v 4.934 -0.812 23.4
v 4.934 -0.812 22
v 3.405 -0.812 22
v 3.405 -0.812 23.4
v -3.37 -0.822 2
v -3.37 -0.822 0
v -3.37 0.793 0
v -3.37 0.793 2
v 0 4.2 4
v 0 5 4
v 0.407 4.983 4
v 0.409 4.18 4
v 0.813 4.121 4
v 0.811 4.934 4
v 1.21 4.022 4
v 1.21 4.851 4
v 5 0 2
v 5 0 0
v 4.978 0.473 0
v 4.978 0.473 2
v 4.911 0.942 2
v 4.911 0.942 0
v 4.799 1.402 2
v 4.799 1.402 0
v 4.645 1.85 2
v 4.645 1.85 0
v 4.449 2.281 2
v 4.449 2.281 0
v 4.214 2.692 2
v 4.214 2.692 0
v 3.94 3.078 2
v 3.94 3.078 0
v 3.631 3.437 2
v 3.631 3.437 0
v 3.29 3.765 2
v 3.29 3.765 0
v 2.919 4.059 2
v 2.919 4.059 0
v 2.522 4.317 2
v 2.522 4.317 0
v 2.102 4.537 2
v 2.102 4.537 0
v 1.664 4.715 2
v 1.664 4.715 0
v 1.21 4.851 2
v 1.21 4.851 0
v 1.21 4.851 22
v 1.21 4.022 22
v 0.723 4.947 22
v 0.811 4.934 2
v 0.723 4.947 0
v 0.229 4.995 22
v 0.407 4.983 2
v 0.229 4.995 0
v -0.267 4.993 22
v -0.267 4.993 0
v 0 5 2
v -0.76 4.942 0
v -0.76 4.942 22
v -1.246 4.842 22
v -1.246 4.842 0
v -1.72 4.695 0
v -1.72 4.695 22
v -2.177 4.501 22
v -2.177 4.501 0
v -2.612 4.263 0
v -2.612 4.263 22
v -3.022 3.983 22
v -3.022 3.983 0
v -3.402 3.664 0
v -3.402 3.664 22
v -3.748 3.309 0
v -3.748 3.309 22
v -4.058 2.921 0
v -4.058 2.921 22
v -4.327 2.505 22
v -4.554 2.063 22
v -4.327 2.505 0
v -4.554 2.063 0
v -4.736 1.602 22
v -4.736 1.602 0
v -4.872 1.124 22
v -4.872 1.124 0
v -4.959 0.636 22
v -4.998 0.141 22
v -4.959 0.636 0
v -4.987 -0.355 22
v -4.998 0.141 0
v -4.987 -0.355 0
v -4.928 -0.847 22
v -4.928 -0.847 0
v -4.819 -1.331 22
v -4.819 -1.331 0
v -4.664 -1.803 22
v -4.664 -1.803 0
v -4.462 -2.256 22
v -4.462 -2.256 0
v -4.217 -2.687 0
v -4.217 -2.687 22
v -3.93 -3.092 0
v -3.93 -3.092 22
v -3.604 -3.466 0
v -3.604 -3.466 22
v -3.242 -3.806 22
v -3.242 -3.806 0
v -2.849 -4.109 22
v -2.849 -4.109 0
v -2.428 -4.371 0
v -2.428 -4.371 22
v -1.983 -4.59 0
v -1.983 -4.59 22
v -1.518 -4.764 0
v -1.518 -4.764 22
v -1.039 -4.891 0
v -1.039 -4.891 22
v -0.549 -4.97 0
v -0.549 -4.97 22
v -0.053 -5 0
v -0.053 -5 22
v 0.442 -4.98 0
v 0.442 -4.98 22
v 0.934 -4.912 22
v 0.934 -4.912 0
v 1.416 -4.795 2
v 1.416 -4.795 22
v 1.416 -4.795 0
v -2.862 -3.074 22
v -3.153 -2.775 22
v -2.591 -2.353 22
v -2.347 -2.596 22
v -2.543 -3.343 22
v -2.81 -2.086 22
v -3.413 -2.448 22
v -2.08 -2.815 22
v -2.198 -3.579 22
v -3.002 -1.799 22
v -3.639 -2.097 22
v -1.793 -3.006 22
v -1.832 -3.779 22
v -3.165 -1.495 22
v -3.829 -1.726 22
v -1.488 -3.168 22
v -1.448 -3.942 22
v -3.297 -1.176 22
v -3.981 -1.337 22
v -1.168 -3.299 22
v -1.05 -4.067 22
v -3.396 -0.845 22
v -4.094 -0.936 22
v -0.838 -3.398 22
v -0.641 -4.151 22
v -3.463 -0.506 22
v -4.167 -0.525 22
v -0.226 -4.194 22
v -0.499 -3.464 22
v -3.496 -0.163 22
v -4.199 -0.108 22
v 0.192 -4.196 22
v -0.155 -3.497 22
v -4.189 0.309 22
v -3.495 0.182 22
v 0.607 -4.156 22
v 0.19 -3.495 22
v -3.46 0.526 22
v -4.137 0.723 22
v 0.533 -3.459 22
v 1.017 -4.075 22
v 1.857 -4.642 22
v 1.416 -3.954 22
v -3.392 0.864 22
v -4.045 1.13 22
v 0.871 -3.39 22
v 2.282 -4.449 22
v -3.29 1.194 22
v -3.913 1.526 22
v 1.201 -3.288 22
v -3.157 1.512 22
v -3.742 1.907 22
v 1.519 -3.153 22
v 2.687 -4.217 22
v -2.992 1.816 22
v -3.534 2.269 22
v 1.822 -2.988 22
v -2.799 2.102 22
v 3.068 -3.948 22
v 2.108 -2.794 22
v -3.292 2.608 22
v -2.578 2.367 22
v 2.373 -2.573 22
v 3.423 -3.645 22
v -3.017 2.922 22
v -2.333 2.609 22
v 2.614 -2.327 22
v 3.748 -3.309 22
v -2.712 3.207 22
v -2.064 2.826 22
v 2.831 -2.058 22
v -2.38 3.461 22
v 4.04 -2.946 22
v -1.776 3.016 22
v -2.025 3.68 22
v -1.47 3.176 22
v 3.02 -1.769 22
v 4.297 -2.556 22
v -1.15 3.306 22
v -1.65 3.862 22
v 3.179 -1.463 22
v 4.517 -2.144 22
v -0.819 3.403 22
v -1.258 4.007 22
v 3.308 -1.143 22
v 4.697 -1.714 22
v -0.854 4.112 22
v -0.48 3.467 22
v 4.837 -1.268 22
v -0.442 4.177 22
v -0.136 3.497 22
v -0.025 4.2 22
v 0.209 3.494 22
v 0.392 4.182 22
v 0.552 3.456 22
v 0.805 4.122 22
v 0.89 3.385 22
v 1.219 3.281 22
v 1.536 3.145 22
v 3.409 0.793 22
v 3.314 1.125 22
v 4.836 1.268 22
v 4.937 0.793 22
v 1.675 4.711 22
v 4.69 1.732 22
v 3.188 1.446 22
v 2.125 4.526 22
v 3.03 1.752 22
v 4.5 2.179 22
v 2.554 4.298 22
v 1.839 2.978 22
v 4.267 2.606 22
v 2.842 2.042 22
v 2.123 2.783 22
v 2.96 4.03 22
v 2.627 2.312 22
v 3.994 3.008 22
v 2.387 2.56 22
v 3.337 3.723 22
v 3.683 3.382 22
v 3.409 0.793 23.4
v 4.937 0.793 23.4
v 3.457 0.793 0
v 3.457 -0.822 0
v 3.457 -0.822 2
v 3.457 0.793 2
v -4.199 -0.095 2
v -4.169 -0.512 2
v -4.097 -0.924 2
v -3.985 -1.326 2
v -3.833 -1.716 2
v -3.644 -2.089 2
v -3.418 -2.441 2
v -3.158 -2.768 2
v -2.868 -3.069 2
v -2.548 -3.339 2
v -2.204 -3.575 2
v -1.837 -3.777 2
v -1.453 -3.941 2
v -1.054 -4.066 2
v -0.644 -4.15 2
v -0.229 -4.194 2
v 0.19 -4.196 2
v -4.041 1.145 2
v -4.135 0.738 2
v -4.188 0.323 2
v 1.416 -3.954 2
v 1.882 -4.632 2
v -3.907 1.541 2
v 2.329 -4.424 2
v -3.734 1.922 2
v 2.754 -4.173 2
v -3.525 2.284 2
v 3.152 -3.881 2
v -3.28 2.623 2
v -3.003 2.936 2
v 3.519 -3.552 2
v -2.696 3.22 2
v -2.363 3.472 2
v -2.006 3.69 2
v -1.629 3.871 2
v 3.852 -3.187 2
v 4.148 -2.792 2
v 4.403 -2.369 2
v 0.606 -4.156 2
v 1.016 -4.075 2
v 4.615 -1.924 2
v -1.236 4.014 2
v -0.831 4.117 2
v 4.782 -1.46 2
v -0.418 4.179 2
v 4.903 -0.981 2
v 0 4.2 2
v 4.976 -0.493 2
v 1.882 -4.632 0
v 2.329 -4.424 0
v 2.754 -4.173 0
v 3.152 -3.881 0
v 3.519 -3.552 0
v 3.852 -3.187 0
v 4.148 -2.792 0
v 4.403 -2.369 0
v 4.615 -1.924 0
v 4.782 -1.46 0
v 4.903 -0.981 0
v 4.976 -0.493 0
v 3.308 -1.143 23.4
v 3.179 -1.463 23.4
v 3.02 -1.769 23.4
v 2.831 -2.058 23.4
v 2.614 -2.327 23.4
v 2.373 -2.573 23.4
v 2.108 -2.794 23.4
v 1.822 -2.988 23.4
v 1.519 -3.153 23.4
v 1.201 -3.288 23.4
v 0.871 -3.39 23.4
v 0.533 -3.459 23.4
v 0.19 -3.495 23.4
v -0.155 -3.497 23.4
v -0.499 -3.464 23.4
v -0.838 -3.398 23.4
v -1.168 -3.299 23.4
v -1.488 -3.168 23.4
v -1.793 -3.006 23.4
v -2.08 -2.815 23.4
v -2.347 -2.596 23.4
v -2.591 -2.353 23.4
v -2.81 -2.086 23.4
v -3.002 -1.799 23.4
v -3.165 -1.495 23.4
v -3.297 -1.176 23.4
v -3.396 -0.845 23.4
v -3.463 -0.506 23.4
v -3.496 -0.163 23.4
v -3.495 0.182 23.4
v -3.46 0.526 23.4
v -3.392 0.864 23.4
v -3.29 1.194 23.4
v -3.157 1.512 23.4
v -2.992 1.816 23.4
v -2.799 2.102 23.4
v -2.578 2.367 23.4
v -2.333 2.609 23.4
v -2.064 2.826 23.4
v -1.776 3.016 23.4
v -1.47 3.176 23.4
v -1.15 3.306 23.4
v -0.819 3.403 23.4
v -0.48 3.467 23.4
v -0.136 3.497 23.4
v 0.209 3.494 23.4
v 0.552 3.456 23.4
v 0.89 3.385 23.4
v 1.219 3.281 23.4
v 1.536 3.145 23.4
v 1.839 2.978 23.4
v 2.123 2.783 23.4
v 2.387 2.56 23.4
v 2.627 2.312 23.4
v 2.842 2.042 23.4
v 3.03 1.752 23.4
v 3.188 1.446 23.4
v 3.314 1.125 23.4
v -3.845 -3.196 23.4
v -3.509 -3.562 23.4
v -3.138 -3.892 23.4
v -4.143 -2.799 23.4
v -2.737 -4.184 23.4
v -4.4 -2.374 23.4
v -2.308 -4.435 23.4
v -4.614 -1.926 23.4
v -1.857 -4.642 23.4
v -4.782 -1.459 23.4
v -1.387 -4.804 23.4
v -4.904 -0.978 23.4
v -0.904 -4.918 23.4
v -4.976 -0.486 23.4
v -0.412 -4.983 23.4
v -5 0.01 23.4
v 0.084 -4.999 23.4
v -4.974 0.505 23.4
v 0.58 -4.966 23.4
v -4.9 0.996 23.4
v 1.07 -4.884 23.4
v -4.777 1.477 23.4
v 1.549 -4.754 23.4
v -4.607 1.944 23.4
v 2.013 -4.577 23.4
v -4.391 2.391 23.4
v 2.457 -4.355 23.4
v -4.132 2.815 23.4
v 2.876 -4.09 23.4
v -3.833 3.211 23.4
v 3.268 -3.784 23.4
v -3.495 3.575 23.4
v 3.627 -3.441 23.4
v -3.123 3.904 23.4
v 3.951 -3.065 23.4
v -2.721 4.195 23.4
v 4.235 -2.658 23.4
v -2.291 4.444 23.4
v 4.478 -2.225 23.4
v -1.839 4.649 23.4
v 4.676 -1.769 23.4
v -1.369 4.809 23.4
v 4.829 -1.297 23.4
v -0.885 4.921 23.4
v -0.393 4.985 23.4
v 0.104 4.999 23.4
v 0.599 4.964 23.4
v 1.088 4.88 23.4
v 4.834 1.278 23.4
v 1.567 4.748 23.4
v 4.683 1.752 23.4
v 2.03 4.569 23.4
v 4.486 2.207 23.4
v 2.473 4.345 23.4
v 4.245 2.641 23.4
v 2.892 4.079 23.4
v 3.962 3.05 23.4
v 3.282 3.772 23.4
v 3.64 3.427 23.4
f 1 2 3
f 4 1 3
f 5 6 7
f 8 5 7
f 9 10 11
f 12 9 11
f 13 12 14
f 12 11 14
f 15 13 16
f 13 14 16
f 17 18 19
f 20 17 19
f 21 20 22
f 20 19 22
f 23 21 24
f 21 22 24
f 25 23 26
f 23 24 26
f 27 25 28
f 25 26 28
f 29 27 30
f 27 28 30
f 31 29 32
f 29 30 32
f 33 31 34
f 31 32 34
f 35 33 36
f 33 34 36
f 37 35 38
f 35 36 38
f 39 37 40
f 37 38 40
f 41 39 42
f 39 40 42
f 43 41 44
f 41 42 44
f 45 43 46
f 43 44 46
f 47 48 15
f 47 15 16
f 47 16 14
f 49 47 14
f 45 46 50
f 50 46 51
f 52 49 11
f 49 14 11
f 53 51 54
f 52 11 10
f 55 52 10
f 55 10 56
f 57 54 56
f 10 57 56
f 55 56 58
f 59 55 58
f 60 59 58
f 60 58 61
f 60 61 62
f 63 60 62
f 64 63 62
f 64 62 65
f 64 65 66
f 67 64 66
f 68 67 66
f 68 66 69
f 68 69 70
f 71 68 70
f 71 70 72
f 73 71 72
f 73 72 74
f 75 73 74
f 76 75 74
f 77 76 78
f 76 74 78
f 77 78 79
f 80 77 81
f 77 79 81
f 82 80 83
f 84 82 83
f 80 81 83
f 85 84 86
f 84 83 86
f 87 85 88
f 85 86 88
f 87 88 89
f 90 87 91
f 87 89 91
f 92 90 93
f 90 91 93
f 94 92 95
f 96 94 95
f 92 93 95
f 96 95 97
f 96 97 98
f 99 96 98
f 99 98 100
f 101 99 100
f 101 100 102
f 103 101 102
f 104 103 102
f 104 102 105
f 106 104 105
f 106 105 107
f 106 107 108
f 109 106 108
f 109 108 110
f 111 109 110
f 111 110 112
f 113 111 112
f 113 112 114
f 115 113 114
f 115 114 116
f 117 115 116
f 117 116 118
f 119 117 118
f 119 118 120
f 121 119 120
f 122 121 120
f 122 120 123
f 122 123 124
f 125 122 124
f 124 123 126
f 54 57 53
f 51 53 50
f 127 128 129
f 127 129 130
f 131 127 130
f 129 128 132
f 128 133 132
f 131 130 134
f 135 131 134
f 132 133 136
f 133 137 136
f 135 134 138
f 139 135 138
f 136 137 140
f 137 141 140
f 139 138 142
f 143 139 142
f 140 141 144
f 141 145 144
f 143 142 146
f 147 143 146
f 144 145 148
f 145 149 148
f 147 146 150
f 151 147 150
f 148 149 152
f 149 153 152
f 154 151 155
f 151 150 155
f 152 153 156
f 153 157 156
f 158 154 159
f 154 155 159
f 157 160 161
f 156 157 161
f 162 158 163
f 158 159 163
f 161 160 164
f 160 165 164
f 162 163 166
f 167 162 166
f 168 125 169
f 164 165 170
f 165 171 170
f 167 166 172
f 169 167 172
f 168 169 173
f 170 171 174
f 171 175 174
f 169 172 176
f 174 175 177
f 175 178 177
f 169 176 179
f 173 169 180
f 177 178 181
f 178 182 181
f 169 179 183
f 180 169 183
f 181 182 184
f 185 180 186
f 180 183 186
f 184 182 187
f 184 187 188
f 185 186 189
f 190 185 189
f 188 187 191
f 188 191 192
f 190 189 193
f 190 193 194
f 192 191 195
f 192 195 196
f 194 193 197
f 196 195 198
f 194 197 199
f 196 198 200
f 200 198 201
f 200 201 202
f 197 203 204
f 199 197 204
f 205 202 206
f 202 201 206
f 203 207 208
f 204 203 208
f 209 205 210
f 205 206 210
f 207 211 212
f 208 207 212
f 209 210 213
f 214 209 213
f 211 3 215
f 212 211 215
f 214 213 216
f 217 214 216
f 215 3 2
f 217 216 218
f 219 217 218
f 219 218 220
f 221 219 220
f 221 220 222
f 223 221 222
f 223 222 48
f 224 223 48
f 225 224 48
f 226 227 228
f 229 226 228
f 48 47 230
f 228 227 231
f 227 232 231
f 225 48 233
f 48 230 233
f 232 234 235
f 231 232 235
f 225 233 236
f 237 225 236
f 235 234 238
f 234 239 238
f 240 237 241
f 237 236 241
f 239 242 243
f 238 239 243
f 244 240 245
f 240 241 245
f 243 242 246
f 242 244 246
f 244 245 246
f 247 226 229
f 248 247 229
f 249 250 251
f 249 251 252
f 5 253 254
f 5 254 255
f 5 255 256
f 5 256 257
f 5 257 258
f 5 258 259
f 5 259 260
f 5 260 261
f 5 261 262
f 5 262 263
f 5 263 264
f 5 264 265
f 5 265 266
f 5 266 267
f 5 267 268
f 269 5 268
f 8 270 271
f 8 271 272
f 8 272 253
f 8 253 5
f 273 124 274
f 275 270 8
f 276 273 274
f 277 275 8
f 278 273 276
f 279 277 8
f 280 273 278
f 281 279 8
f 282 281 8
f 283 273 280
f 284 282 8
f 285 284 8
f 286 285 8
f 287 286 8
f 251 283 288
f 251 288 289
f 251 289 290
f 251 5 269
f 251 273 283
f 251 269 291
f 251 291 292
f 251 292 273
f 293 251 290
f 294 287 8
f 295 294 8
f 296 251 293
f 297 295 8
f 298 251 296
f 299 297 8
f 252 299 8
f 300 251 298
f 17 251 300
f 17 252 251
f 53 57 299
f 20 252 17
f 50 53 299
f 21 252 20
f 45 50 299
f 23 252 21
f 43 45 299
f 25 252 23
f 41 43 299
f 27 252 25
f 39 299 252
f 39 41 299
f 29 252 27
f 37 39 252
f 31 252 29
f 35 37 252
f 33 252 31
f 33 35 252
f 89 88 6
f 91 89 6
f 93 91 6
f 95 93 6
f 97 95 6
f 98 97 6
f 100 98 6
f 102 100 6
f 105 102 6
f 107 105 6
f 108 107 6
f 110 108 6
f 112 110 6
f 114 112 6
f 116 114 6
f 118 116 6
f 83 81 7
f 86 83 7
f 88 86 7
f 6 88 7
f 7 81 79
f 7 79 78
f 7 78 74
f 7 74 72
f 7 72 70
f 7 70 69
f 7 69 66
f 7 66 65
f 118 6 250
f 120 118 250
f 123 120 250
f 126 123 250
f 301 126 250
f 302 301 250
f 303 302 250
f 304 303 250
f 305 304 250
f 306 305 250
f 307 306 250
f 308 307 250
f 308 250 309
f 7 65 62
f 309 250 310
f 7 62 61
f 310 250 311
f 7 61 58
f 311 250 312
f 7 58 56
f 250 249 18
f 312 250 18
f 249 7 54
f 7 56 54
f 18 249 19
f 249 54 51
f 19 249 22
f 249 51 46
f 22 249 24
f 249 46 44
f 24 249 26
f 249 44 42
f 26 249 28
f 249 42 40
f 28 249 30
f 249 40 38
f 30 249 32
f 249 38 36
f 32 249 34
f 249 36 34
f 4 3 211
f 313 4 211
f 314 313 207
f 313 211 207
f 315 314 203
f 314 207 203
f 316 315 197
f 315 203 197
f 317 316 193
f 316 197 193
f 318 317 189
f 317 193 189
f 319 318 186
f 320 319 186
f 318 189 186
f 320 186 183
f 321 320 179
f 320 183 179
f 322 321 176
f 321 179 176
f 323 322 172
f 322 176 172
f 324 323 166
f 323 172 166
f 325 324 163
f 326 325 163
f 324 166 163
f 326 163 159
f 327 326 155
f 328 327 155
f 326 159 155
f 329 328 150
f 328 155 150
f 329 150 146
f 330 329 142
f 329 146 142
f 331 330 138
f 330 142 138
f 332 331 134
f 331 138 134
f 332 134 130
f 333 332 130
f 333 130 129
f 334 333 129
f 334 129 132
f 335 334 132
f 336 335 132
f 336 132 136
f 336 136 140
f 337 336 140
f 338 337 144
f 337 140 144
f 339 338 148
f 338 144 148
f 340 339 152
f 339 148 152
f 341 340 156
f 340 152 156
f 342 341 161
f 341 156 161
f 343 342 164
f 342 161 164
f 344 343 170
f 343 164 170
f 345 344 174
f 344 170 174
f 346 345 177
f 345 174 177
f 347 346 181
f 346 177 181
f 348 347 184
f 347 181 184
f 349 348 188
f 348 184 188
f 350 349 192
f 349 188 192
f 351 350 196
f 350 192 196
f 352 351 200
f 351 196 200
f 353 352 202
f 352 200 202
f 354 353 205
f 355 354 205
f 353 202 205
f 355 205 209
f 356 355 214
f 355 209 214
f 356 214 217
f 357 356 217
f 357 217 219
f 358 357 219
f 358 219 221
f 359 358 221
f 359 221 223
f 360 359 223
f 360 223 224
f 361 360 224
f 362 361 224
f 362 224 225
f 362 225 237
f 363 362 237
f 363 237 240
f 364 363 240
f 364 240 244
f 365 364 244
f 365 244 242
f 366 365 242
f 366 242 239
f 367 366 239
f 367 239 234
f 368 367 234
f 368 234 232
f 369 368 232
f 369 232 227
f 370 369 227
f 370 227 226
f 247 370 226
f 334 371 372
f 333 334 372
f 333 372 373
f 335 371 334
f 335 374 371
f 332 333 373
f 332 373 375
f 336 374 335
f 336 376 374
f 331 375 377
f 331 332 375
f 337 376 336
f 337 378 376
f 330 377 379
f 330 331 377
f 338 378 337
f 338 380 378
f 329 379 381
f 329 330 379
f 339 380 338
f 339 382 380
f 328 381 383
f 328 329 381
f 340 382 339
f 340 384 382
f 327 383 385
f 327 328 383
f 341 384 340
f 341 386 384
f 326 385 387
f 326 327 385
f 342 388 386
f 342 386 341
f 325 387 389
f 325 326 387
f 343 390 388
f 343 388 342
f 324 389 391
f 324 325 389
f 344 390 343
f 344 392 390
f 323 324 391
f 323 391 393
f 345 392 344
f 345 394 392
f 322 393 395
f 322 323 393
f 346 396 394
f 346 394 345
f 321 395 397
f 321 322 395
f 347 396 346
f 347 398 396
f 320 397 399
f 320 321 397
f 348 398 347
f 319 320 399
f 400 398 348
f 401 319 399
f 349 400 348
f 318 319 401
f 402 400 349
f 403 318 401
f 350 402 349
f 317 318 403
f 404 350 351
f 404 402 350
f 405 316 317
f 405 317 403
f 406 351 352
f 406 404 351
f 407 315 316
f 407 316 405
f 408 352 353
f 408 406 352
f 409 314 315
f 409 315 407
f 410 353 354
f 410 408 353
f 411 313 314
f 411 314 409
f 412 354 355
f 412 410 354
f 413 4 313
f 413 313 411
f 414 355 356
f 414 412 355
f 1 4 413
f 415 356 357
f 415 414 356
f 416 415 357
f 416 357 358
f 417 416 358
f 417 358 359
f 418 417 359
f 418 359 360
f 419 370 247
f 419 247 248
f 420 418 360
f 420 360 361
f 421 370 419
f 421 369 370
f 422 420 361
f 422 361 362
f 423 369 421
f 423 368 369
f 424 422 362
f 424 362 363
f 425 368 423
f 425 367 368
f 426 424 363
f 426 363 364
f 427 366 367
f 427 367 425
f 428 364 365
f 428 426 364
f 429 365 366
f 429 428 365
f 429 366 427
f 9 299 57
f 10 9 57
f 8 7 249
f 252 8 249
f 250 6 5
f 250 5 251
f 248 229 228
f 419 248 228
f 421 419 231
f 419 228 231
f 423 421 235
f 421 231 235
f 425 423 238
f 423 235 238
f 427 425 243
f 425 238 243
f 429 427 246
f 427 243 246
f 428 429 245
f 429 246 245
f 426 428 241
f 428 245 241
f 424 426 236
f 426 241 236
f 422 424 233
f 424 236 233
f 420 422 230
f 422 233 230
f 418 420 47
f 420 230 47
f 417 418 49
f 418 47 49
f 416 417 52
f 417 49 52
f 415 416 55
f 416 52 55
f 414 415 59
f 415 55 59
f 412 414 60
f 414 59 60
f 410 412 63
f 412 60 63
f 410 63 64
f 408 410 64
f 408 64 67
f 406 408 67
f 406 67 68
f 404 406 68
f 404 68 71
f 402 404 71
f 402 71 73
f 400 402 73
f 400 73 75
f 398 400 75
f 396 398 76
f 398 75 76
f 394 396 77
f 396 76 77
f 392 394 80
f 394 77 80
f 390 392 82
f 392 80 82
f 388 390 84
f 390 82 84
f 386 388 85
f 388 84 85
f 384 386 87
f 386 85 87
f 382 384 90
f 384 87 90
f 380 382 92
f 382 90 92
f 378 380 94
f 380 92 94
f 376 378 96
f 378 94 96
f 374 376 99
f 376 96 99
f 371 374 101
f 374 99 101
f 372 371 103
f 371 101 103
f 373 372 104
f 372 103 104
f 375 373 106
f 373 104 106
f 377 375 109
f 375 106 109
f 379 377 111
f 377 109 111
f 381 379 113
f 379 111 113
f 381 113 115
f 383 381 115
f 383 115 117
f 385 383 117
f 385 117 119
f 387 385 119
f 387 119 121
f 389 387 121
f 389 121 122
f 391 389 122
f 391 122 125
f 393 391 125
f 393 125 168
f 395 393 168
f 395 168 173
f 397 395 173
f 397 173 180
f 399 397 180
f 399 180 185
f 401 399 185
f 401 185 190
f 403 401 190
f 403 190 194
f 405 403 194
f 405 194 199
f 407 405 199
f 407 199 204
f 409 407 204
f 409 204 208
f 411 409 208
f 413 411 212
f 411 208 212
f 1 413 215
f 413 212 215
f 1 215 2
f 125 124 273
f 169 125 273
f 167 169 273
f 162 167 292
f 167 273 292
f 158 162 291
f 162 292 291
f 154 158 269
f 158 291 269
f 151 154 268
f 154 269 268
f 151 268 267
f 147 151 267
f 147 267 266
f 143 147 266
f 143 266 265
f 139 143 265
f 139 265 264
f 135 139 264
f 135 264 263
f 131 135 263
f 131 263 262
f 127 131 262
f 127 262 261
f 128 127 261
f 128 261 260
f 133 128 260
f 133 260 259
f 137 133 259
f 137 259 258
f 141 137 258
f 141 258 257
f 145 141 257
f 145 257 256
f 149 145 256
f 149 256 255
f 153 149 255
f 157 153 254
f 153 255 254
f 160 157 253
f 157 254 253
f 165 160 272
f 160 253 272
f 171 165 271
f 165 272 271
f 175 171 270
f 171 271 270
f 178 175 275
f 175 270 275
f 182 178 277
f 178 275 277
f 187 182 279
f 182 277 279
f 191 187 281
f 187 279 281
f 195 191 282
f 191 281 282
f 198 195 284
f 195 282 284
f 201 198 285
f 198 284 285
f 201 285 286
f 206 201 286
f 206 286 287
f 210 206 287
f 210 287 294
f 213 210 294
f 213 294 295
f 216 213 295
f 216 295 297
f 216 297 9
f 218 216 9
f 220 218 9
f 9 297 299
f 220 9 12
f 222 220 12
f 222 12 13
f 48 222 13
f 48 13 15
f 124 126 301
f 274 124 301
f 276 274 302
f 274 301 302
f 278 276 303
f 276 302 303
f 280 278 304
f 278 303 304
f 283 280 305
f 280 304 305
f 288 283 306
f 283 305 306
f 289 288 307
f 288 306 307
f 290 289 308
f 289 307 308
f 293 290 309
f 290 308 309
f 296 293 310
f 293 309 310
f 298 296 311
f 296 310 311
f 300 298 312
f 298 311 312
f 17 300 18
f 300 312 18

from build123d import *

# Parameters (mm, degrees)
F0_W     = 6.8263569847
F0_H     = 1.6141139204
F1_DEPTH = 2
F2_DEPTH = 22
F4_DEPTH = 1.4
F5_W     = 1.2100687839
F5_H     = 1.0110005358
F6_DEPTH = 2


with BuildPart() as f1:
    # F0 (on Top) → F1 (new body)
    with BuildSketch(Plane.XY):
        with BuildLine():
            ThreePointArc((1.4161020408, -4.7952742372), (4.0050287267, -2.9932832973), (5, 0))
            ThreePointArc((5, 0), (3.9401994822, 3.0781208619), (1.2100687839, 4.8513640905))
            Line((1.2100687839, 4.8513640905), (1.2100687839, 4.0219067043))
            ThreePointArc((1.2100687839, 4.0219067043), (-4.1985994161, -0.1084571011), (1.4161020408, -3.9540681595))
            Line((1.4161020408, -3.9540681595), (1.4161020408, -4.7952742372))
        make_face()
        with Locations((0.043381704, -0.0145365484)):
            Rectangle(F0_W, F0_H, mode=Mode.SUBTRACT)
    extrude(amount=F1_DEPTH)

    # F0 (on Top) → F2 (join)
    with BuildSketch(Plane.XY):
        with BuildLine():
            Line((1.2100687839, 4.0219067043), (1.2100687839, 4.8513640905))
            ThreePointArc((1.2100687839, 4.8513640905), (-4.9988599757, -0.1067658356), (1.4161020408, -4.7952742372))
            Line((1.4161020408, -4.7952742372), (1.4161020408, -3.9540681595))
            ThreePointArc((1.4161020408, -3.9540681595), (-4.1985994161, -0.1084571011), (1.2100687839, 4.0219067043))
        make_face()
    extrude(amount=F2_DEPTH)

    # F3 (on face) → F4 (join)
    with BuildSketch(Plane.XY.offset(22)):
        with BuildLine():
            ThreePointArc((3.4046116017, -0.8115539672), (-3.4999864728, 0.0097308767), (3.409071597, 0.792610148))
            Line((3.409071597, 0.792610148), (4.9367772031, 0.792610148))
            ThreePointArc((4.9367772031, 0.792610148), (-4.9999907913, 0.0095961861), (4.933698426, -0.8115539672))
            Line((4.933698426, -0.8115539672), (3.4046116017, -0.8115539672))
        make_face()
    extrude(amount=F4_DEPTH)

    # F5 (on face) → F6 (cut)
    with BuildSketch(Plane.XY.offset(2)):
        with Locations((0.6050343919, 4.5274069722)):
            Rectangle(F5_W, F5_H)
    extrude(amount=F6_DEPTH, mode=Mode.SUBTRACT)


solid = f1.part
